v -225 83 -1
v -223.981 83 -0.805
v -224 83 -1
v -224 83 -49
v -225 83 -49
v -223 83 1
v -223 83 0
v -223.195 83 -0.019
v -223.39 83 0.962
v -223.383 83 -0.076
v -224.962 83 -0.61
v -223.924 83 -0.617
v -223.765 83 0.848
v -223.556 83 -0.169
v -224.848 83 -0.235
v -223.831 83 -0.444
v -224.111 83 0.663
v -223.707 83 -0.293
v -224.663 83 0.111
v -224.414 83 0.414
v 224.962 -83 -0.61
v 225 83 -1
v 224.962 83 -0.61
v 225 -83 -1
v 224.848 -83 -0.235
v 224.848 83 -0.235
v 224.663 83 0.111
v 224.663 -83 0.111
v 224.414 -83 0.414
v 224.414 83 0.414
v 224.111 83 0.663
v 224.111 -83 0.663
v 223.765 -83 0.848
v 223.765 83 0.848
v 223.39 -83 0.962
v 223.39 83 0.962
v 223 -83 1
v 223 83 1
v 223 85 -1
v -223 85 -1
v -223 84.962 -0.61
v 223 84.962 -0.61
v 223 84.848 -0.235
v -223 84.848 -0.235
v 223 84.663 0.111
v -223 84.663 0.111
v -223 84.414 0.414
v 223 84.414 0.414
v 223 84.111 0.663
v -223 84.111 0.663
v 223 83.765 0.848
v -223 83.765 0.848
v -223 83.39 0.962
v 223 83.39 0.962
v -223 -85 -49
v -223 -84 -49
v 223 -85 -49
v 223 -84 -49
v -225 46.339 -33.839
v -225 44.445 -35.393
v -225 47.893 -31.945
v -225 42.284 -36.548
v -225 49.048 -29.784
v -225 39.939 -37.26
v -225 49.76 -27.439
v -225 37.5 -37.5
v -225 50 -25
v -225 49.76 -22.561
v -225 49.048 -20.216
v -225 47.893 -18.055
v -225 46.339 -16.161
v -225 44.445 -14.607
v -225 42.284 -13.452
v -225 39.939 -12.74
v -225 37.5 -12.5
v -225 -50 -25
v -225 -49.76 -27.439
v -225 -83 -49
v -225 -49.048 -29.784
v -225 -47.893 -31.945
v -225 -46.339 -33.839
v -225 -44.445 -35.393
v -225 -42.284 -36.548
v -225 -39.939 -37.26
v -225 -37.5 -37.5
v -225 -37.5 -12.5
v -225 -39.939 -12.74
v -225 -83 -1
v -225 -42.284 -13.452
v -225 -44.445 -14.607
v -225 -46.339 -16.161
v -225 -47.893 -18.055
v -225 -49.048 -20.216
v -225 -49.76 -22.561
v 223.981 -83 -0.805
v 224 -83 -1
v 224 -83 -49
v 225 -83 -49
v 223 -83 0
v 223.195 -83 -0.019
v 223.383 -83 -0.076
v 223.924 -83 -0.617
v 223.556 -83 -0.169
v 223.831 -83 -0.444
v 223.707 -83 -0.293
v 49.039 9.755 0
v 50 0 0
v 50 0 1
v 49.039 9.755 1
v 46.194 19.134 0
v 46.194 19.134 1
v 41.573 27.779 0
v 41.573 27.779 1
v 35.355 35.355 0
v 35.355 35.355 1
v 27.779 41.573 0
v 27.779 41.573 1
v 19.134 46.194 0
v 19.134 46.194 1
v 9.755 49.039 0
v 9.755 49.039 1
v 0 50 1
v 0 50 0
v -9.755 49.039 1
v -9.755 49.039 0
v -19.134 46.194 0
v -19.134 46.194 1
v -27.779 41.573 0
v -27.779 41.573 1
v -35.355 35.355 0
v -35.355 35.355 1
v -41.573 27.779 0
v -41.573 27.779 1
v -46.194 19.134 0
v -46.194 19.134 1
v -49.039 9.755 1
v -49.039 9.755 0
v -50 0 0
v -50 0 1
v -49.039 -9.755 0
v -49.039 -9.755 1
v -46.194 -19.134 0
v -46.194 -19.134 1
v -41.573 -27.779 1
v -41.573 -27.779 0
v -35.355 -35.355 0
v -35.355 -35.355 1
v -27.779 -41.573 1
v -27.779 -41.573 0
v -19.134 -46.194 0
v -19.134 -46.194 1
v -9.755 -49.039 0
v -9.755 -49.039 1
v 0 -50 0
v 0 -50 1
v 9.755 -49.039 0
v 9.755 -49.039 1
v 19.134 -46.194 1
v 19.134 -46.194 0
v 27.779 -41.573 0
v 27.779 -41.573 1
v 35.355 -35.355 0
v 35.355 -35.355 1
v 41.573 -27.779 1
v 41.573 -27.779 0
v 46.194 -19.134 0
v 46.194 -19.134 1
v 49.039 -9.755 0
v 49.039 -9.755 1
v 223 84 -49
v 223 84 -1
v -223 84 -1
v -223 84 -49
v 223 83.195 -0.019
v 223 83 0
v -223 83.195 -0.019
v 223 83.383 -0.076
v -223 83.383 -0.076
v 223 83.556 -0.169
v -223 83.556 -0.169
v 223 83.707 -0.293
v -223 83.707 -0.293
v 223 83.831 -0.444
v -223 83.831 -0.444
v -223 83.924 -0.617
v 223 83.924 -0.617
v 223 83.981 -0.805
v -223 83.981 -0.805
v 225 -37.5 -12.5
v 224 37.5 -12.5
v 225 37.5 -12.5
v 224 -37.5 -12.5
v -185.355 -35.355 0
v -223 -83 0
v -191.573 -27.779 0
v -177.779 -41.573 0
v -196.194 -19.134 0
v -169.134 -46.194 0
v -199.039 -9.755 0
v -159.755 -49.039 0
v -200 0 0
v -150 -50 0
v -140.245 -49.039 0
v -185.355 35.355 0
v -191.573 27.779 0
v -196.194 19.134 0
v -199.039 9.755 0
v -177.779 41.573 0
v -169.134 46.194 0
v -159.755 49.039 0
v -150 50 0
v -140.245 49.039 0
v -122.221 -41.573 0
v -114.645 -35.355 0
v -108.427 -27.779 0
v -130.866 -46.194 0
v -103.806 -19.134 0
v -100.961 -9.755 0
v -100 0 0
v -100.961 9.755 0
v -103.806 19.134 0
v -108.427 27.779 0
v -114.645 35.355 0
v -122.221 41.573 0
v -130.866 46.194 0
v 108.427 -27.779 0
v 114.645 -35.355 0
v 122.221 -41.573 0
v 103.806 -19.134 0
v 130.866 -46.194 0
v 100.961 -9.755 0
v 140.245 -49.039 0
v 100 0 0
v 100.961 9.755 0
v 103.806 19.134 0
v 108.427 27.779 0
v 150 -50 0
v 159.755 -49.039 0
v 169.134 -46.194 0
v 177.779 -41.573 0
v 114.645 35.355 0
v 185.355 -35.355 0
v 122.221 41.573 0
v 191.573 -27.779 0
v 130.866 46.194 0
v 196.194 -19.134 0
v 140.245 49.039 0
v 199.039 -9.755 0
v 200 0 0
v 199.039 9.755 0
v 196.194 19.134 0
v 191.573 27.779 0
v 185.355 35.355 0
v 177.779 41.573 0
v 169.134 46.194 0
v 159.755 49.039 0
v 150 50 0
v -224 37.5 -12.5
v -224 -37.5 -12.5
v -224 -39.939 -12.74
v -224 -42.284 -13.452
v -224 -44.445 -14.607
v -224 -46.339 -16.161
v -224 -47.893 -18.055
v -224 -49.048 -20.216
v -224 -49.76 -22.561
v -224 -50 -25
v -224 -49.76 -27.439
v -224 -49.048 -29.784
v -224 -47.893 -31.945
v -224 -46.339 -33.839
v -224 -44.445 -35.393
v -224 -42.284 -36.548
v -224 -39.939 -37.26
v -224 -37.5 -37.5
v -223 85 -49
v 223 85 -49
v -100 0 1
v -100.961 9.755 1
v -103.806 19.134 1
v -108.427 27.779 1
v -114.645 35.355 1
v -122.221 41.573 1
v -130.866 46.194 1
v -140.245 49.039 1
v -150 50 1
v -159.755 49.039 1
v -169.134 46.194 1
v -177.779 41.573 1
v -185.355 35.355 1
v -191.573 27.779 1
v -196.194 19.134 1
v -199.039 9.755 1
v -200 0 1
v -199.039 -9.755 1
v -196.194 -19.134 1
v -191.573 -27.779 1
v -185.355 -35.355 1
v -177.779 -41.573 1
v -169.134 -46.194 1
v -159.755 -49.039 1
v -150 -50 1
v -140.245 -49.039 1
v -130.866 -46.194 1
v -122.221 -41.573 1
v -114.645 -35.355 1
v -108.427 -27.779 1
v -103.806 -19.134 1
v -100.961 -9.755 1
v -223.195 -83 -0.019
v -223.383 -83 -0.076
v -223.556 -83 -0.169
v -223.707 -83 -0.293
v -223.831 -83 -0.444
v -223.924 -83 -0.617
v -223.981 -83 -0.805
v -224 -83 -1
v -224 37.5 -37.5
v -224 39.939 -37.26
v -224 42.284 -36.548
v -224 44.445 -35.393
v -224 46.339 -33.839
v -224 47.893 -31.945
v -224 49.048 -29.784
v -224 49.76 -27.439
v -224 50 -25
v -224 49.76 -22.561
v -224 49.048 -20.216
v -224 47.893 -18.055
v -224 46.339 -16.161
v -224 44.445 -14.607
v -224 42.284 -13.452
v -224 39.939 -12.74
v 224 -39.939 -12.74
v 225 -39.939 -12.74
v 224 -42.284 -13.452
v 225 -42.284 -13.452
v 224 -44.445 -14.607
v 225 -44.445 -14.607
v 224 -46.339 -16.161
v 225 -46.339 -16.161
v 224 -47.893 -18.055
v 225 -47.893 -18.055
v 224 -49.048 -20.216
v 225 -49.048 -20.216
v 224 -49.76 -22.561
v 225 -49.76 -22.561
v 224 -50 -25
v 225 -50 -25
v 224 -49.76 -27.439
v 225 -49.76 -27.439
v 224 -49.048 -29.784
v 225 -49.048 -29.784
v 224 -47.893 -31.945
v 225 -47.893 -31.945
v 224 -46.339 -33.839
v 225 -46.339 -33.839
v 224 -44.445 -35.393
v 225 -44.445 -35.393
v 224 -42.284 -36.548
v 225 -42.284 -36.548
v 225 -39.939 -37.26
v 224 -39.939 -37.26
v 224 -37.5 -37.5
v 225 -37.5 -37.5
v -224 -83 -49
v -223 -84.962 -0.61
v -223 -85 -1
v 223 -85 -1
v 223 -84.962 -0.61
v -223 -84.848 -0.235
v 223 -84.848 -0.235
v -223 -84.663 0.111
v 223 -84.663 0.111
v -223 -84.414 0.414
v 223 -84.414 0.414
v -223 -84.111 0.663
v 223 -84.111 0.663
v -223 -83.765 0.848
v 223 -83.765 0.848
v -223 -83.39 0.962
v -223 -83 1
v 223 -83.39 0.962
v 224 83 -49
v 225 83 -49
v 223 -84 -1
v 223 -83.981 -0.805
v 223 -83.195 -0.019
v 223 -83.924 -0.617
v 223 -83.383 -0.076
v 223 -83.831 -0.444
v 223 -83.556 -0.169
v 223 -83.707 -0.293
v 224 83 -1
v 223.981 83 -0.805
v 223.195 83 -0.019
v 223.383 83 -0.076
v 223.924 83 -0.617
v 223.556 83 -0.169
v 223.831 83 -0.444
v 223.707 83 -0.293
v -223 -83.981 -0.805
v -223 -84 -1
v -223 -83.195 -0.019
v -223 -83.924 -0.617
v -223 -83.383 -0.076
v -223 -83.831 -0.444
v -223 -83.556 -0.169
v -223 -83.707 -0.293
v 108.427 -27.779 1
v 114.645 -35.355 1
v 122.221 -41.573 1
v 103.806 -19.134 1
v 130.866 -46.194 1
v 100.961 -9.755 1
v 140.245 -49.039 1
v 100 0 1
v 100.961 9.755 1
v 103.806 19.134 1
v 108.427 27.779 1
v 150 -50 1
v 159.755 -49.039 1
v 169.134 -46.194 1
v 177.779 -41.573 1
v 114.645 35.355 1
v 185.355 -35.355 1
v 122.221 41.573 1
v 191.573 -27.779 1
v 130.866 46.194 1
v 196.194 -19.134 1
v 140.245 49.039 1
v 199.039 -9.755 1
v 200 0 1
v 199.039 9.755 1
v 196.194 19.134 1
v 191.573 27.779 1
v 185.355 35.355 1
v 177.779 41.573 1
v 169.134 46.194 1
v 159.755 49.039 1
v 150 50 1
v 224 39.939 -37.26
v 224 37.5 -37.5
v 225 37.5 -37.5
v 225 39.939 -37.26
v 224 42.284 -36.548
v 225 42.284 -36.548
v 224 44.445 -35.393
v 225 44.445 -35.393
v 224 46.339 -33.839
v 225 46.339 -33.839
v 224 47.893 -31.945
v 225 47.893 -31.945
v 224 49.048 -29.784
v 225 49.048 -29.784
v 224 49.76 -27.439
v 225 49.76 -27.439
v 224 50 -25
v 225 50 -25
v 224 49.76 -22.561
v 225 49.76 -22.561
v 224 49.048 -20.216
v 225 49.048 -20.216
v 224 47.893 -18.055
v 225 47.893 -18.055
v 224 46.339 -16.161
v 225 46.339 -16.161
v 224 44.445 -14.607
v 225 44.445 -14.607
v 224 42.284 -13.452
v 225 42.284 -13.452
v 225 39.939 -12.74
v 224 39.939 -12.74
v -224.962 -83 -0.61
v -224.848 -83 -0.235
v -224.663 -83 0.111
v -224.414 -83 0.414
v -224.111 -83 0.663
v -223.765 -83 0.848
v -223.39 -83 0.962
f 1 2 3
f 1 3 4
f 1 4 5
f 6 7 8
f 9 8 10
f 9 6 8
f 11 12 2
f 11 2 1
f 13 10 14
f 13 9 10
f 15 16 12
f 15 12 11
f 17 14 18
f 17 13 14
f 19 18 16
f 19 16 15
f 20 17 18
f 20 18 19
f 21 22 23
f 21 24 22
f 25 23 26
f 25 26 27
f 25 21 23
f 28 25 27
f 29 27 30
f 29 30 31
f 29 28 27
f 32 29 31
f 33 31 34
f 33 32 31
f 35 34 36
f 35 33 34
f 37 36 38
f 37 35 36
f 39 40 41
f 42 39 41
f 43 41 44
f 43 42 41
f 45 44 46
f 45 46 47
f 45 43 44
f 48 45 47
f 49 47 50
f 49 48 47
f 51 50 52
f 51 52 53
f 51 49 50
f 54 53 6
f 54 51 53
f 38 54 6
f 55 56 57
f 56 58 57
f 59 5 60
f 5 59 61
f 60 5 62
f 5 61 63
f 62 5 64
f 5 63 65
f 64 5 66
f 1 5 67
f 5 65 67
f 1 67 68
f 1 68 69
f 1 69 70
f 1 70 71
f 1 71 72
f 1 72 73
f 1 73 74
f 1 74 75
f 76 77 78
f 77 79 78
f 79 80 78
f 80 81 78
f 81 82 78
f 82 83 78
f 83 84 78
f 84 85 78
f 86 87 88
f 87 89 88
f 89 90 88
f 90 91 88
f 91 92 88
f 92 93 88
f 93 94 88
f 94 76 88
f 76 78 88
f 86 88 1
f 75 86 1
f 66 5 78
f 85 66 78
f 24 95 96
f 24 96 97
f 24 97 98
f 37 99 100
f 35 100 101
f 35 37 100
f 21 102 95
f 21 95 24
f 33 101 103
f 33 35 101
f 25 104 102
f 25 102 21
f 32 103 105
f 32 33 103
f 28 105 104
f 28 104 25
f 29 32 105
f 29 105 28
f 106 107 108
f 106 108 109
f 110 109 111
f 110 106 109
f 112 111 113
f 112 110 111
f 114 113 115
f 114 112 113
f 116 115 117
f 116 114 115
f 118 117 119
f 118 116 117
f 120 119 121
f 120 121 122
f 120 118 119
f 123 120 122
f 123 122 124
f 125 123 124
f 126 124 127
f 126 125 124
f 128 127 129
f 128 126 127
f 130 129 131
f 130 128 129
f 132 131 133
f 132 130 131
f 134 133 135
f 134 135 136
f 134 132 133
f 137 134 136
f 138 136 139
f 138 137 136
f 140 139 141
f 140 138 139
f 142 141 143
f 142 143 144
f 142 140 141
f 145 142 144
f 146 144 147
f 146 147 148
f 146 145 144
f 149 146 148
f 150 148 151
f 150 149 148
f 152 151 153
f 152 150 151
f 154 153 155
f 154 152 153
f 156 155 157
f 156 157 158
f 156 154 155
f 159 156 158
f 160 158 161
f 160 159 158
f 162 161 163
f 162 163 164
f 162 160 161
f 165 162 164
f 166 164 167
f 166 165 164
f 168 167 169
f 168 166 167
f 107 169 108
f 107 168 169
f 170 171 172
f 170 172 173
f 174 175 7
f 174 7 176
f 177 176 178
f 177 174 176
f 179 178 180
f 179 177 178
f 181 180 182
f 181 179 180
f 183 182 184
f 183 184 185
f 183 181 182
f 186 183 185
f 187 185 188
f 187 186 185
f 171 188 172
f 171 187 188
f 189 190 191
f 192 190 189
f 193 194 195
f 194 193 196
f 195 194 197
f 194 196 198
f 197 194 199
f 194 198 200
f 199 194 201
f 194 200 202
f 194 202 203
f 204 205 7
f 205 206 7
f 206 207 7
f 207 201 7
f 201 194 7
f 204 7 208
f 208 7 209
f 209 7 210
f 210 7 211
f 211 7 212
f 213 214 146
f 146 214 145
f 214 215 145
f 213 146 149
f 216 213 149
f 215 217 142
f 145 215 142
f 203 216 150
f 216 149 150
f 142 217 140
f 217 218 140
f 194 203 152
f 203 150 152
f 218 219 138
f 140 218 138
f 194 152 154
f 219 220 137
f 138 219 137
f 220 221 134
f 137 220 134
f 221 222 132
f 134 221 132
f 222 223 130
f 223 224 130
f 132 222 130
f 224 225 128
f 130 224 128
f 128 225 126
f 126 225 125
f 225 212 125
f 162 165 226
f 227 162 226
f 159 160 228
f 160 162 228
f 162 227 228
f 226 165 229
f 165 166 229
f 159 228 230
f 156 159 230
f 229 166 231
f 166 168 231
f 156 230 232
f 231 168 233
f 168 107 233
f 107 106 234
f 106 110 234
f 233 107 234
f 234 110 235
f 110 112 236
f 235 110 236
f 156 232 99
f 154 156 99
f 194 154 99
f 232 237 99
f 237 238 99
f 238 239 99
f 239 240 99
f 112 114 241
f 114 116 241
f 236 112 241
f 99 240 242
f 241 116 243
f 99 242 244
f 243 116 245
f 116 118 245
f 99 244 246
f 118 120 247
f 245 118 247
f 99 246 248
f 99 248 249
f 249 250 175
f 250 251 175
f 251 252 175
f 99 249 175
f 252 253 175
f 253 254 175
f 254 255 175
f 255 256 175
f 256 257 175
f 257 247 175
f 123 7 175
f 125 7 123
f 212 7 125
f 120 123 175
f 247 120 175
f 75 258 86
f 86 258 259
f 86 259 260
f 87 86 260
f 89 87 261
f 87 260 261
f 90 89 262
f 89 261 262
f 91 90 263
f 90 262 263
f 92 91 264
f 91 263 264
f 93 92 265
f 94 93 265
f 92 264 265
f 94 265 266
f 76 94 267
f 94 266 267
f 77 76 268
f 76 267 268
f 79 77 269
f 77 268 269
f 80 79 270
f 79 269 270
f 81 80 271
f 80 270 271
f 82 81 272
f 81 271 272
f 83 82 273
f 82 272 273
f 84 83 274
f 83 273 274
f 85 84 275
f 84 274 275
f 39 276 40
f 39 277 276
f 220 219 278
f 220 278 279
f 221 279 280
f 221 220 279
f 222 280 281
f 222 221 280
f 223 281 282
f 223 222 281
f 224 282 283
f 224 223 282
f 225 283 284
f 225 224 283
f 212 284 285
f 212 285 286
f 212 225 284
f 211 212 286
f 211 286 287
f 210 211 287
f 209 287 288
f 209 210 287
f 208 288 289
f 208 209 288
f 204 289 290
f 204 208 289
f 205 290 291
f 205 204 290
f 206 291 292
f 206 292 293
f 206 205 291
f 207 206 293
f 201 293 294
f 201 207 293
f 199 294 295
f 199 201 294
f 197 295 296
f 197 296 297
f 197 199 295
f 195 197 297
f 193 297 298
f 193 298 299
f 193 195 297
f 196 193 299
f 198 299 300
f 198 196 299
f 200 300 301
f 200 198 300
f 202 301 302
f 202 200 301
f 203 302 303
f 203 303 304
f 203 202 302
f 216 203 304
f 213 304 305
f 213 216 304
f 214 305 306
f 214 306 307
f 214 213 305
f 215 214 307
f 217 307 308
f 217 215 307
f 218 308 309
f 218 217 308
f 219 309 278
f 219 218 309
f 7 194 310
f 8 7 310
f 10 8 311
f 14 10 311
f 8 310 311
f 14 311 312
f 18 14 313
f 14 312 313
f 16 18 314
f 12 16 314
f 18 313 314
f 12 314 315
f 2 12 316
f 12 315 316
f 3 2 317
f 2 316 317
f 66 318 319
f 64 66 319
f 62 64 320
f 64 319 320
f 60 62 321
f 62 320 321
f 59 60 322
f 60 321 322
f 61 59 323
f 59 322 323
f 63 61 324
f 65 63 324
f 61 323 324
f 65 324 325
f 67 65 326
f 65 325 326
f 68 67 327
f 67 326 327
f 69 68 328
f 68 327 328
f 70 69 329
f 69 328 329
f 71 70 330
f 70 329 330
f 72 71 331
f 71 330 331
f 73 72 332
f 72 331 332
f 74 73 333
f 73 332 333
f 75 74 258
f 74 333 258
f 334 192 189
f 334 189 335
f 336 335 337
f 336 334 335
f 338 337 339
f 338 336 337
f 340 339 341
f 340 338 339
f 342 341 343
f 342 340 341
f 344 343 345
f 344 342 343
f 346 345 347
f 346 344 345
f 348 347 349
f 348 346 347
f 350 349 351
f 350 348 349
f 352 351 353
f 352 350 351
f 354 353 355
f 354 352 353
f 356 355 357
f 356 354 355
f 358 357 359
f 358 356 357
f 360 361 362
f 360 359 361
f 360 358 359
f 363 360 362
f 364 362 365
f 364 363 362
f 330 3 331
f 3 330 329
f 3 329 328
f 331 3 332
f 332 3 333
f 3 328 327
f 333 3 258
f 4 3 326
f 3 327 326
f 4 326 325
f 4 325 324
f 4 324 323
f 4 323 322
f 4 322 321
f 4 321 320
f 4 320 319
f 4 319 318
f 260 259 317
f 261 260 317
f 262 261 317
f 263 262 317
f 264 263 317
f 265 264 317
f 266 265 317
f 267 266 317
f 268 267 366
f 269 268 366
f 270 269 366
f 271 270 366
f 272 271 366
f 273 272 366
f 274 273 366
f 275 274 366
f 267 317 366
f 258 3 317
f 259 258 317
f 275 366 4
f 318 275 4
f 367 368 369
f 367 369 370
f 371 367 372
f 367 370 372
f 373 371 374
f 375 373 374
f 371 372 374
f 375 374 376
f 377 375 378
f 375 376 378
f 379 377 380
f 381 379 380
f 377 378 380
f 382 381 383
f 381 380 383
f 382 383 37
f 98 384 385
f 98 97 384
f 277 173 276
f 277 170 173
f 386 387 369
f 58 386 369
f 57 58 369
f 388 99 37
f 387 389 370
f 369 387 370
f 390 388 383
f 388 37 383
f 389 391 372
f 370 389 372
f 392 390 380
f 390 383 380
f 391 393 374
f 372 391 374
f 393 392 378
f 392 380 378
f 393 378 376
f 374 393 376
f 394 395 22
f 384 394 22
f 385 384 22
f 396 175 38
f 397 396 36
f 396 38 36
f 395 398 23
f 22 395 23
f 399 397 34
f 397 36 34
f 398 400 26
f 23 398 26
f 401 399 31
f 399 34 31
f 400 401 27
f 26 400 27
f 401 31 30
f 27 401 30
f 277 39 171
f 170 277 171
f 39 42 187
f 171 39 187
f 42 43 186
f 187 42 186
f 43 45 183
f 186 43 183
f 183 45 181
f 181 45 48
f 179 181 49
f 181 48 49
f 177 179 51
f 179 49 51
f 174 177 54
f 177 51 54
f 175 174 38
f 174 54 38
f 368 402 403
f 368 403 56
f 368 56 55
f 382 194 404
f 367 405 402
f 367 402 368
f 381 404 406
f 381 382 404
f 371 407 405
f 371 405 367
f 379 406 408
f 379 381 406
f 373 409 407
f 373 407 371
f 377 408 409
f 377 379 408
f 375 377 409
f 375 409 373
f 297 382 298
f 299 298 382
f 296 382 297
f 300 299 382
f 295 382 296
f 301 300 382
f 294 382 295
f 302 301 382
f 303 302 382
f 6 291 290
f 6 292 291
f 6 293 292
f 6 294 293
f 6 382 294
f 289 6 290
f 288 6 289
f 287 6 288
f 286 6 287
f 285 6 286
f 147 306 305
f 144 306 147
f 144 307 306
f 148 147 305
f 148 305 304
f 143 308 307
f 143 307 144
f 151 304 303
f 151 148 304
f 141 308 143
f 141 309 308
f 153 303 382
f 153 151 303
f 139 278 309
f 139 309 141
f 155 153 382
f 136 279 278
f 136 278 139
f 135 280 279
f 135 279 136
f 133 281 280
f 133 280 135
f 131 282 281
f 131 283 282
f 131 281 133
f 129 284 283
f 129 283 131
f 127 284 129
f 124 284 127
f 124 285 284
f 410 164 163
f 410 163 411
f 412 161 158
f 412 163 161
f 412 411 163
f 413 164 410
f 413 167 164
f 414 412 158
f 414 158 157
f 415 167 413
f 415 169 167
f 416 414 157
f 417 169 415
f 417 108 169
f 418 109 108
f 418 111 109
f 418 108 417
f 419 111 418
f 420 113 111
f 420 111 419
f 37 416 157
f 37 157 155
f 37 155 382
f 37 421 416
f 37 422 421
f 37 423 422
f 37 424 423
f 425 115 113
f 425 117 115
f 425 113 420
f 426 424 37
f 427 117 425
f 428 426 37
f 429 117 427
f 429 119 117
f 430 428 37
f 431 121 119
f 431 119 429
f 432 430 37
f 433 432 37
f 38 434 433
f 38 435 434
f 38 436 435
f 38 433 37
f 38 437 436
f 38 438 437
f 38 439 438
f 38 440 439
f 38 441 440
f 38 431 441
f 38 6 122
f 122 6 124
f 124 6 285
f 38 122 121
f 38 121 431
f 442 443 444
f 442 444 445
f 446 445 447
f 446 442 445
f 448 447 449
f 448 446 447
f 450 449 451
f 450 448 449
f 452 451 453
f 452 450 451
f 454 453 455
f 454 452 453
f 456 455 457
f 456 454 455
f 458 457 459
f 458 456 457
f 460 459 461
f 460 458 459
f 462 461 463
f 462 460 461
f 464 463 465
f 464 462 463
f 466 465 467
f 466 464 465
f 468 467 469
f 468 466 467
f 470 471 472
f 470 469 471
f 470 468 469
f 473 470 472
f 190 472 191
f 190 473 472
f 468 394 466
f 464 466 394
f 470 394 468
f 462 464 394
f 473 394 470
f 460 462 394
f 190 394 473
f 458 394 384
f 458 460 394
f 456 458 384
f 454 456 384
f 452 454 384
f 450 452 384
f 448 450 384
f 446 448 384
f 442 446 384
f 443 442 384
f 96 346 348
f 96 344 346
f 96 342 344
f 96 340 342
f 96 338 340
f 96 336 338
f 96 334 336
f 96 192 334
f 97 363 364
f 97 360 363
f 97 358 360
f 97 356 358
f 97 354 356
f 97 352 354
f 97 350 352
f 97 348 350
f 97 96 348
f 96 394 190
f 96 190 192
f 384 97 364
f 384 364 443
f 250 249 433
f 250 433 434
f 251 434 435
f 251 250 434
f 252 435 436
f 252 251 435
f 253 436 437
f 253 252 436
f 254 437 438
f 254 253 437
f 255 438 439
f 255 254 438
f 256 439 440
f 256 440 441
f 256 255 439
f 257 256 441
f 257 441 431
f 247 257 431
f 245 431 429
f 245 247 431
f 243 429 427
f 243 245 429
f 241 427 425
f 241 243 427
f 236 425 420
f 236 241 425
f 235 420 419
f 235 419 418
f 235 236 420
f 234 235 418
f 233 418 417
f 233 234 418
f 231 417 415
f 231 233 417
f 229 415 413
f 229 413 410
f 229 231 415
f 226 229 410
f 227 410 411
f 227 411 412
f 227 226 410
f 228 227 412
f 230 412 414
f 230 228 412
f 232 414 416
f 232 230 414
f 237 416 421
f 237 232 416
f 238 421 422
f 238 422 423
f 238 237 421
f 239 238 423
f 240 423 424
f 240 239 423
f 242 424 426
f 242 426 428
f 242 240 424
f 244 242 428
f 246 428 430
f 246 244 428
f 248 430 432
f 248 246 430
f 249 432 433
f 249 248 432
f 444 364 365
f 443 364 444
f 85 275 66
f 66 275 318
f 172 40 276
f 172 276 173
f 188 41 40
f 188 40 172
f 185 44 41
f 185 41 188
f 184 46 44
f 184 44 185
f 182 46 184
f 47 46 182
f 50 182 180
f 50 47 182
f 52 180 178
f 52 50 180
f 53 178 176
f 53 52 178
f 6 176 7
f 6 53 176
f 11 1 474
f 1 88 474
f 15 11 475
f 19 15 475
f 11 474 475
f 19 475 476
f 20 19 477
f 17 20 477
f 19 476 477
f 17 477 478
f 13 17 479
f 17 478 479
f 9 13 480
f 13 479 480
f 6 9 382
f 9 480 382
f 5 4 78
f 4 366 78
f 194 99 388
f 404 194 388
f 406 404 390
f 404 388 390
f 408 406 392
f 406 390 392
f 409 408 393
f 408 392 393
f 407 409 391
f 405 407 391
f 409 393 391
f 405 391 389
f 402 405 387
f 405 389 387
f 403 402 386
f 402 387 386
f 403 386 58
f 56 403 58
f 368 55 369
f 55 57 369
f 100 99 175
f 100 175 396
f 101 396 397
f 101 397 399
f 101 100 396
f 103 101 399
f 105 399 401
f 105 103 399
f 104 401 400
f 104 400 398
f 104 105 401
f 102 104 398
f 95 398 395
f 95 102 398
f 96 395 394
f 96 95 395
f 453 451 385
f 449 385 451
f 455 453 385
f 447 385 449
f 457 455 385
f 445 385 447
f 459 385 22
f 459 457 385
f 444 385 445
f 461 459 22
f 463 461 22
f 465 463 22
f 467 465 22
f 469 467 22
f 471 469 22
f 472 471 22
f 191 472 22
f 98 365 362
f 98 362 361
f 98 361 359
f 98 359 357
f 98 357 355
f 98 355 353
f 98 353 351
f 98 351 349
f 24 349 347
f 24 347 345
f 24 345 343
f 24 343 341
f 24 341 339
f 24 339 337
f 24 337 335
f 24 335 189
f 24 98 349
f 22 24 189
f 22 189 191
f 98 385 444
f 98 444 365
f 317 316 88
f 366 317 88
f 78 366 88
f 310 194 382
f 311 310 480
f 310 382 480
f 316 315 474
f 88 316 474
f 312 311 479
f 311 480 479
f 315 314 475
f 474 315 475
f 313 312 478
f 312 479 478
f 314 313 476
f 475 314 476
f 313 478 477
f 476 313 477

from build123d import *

# Parameters (mm, degrees)
F3_W           = 446
F3_H           = 166
F3_R           = 50
F4_DEPTH       = 1
F6_DEPTH       = 223
F8_DEPTH       = 83
F10_DEPTH      = 225.001
F10_DEPTH_BACK = 225.001


# Not quite as in the source:
# - a pattern or mirror of a feature is missing from the dataset's text; its kind, count and spacing are read off the source's solid


with BuildPart() as f4:
    # F3 (on Top) → F4 (new body)
    with BuildSketch(Plane.XY):
        Rectangle(F3_W, F3_H)
        with Locations((-150, 0)):
            Circle(F3_R, mode=Mode.SUBTRACT)
        Circle(F3_R, mode=Mode.SUBTRACT)
        with Locations((150, 0)):
            Circle(F3_R, mode=Mode.SUBTRACT)
    extrude(amount=F4_DEPTH)

    # F5 (on Right) → F6 (join, symmetric)
    with BuildSketch(Plane.YZ):
        with BuildLine():
            ThreePointArc((85, -1), (84.4142135624, 0.4142135624), (83, 1))
            Line((83, 1), (83, 0))
            ThreePointArc((83, 0), (83.7071067812, -0.2928932188), (84, -1))
            Line((84, -1), (84, -49))
            Line((84, -49), (85, -49))
            Line((85, -49), (85, -1))
        make_face()
    f6 = extrude(amount=F6_DEPTH, both=True)

    # F6_copies: F6 across plane
    add(f6.mirror(Plane(origin=(0, 0, 0), x_dir=(0, 0, -1), z_dir=(0, -1, 0))))

    # F7 (on Front) → F8 (join, symmetric)
    with BuildSketch(Plane.XZ):
        with BuildLine():
            ThreePointArc((225, -1), (224.4142135624, 0.4142135624), (223, 1))
            Line((223, 1), (223, 0))
            ThreePointArc((223, 0), (223.7071067812, -0.2928932188), (224, -1))
            Line((224, -1), (224, -49))
            Line((224, -49), (225, -49))
            Line((225, -49), (225, -1))
        make_face()
    f8 = extrude(amount=F8_DEPTH, both=True)

    # F8_copies: F8 across plane
    add(f8.mirror(Plane(origin=(0, 0, 0), x_dir=(0, 0, -1), z_dir=(-1, 0, 0))))

    # F9 (on Right) → F10 (cut, two sides)
    with BuildSketch(Plane.YZ) as f10_sk:
        with BuildLine():
            ThreePointArc((37.5, -37.5), (50, -25), (37.5, -12.5))
            Line((37.5, -12.5), (-37.5, -12.5))
            ThreePointArc((-37.5, -12.5), (-50, -25), (-37.5, -37.5))
            Line((-37.5, -37.5), (37.5, -37.5))
        make_face()
    extrude(amount=-F10_DEPTH, mode=Mode.SUBTRACT)
    extrude(f10_sk.sketch, amount=F10_DEPTH_BACK, mode=Mode.SUBTRACT)


solid = f4.part
